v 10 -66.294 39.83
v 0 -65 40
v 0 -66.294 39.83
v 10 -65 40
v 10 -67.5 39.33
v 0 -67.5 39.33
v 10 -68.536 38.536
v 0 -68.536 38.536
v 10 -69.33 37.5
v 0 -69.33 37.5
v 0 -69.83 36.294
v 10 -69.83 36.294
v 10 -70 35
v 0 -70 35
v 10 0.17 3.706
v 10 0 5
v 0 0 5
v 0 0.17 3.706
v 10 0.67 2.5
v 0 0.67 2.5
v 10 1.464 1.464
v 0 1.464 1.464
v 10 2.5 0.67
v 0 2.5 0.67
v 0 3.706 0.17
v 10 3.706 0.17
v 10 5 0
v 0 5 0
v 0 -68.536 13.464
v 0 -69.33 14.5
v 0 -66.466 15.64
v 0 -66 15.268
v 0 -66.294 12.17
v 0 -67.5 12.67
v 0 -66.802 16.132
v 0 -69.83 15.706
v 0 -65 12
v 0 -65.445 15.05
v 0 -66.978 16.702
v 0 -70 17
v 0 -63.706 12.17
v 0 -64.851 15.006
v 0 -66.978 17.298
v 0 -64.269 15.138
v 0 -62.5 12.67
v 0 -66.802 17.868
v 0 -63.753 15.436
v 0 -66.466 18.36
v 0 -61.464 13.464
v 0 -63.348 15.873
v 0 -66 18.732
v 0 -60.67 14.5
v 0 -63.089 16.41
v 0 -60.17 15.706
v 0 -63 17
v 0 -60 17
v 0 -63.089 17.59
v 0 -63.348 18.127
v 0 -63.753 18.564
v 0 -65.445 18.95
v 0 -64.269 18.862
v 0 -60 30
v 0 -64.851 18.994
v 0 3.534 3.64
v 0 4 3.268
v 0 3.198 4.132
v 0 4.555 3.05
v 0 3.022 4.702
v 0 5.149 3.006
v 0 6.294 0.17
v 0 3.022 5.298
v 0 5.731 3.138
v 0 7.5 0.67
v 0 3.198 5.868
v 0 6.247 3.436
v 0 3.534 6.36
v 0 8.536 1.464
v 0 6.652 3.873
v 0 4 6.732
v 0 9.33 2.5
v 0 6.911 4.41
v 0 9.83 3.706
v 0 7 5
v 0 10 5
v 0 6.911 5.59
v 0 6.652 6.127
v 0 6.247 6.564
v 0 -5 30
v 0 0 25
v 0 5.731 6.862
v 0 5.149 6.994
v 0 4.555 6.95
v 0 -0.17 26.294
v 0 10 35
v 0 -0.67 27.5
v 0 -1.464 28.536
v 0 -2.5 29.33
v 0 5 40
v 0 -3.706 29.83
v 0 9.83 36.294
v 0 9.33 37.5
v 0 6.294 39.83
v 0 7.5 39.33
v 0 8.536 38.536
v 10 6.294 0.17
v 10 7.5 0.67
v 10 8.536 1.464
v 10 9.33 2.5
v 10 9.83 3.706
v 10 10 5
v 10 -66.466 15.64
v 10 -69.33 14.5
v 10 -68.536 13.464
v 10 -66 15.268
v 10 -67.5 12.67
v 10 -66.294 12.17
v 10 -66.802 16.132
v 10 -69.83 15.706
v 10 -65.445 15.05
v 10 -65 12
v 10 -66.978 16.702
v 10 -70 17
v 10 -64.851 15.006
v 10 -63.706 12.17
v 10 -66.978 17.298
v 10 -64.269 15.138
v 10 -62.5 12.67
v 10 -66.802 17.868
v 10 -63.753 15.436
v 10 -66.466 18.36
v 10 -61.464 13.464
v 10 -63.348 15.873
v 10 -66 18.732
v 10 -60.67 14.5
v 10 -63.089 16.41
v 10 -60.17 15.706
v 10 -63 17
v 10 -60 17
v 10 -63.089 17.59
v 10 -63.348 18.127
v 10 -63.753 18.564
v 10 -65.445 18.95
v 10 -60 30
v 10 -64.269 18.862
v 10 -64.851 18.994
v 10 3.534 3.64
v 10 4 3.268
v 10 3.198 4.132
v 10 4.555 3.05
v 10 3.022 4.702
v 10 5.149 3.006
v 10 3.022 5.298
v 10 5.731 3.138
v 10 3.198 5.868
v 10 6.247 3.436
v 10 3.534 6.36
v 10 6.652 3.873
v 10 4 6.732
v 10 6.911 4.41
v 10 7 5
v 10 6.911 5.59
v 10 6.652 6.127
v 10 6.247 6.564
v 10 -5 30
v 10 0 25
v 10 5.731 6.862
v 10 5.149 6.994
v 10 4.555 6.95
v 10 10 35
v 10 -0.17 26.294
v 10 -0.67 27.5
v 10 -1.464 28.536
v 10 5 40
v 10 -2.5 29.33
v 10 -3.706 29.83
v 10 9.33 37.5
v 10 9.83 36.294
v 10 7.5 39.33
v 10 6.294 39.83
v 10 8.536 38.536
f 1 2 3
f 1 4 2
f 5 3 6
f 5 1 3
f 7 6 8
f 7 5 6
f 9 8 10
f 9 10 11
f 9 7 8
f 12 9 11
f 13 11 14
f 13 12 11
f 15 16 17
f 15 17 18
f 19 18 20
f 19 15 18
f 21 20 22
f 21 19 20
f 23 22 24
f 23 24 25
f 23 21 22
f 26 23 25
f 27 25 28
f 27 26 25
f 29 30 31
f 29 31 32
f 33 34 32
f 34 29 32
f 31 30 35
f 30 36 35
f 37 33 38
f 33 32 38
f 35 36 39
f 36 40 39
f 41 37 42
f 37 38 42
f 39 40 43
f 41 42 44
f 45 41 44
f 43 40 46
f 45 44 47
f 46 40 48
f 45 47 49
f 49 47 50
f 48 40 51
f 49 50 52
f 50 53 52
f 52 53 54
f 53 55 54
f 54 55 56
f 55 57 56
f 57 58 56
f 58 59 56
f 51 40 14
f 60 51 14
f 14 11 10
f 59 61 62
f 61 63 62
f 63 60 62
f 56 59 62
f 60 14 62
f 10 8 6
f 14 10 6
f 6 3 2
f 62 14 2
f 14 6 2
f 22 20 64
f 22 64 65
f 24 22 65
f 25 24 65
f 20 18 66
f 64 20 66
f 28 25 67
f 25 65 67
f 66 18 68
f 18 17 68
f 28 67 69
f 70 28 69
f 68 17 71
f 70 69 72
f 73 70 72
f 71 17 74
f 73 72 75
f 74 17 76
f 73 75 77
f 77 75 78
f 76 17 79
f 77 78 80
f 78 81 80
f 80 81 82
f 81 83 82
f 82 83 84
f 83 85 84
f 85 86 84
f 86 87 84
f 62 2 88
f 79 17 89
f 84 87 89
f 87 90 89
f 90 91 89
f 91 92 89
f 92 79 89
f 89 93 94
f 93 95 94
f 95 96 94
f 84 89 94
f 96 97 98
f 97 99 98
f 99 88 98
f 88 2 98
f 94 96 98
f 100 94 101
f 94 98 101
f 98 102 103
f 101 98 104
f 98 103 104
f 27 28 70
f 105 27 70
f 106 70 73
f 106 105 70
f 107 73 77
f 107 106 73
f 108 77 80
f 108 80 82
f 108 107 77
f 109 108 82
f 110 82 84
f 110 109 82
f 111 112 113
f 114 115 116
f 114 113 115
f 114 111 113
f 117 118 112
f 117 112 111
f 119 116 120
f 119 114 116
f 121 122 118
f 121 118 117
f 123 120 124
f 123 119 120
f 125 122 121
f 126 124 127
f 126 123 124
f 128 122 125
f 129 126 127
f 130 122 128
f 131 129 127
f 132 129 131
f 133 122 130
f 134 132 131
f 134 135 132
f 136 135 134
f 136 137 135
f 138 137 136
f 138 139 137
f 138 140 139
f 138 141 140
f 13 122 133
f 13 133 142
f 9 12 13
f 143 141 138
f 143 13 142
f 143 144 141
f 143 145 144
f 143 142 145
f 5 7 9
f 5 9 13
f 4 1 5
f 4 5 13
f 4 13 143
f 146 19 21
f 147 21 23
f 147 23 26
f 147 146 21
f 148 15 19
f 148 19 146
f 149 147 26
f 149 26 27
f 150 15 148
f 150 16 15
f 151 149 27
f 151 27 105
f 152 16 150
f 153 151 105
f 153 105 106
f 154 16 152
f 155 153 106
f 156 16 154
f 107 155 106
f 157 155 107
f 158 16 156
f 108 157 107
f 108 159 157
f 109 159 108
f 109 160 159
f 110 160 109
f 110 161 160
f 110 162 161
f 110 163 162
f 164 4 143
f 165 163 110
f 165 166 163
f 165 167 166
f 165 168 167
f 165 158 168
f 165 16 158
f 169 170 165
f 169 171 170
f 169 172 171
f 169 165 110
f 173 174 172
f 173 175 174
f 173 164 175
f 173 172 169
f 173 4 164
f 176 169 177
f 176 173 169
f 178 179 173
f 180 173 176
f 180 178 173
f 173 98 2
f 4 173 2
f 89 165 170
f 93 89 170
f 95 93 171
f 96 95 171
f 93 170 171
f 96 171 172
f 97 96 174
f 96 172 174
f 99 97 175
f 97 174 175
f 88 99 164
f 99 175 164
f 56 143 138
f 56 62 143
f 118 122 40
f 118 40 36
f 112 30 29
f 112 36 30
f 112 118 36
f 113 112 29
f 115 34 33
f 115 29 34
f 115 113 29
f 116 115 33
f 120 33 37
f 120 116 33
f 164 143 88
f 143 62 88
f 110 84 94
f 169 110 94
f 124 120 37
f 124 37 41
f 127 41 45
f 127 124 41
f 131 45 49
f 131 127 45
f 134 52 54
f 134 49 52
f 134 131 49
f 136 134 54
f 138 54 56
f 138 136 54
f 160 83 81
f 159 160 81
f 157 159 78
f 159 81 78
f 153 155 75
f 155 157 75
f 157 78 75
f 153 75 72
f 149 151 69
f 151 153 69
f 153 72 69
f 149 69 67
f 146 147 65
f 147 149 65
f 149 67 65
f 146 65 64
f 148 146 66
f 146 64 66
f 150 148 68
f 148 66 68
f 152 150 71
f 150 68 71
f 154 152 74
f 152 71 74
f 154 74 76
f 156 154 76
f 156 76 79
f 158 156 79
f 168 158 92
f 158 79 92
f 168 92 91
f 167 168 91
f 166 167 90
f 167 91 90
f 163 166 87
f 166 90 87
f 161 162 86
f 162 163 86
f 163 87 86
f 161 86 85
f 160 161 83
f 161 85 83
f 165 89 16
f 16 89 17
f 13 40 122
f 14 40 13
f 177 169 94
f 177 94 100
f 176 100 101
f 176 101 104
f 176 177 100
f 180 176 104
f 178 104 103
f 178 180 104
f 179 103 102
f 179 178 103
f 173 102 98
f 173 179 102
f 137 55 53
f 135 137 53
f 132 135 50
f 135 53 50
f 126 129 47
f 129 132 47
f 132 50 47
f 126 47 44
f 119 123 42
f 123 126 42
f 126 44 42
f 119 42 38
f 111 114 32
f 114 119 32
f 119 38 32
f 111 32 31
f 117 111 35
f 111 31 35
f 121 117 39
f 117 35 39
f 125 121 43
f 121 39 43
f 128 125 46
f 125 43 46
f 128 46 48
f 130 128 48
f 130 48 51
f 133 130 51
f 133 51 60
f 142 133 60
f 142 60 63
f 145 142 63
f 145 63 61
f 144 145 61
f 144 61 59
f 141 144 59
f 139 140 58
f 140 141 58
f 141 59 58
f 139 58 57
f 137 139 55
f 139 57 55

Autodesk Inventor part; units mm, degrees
ref_plane "YZ Plane" through (0, 0, 0) normal (1, 0, 0) x (0, 1, 0)
ref_plane "XZ Plane" through (0, 0, 0) normal (0, 1, 0) x (-1, 0, 0)
ref_plane "XY Plane" through (0, 0, 0) normal (0, 0, 1) x (1, 0, 0)
sketch "Эскиз1" plane through (0, 0, 0) normal (1, 0, 0) x (0, 1, 0)
  line L0 (0, 0) -> (10, 0)
  line L1 (10, 0) -> (10, 40)
  line L2 (10, 40) -> (0, 40)
  line L3 (0, 40) -> (0, 0)
  line L4 (10, 40) -> (-70, 40)
  line L5 (-70, 40) -> (-70, 30)
  line L6 (-70, 30) -> (10, 30)
  line L7 (10, 30) -> (10, 40)
  circle A0 centre (5, 5) radius 2
  line L8 (-70, 40) -> (-60, 40)
  line L9 (-60, 40) -> (-60, 12)
  line L10 (-60, 12) -> (-70, 12)
  line L11 (-70, 12) -> (-70, 40)
  circle A1 centre (-65, 17) radius 2
  point P0 (5, 0)
  point P1 (0, 40)
  point P2 (0, 30)
  point P3 (-70, 35)
  point P4 (-65, 12)
  point P5 (-60, 30)
  point P6 (-70, 30)
  dimension "d0" = 10
  dimension "d1" = 10
  dimension "d2" = 40
  dimension "d3" = 4
  dimension "d4" = 5
  dimension "d5" = 5
  dimension "d6" = 80
  dimension "d13" = 28
  dimension "d14" = 10
  dimension "d15" = 5
extrude "Выдавливание1" add sketch "Эскиз1" along normal blind 10
fillet "Сопряжение1" radius 5 7 edges at (5, 0, 30) (5, 10, 40) (5, 10, 0) (5, 0, 0) (5, -70, 40) (5, -60, 12) (5, -70, 12)
properties part number "колено для сервы"
